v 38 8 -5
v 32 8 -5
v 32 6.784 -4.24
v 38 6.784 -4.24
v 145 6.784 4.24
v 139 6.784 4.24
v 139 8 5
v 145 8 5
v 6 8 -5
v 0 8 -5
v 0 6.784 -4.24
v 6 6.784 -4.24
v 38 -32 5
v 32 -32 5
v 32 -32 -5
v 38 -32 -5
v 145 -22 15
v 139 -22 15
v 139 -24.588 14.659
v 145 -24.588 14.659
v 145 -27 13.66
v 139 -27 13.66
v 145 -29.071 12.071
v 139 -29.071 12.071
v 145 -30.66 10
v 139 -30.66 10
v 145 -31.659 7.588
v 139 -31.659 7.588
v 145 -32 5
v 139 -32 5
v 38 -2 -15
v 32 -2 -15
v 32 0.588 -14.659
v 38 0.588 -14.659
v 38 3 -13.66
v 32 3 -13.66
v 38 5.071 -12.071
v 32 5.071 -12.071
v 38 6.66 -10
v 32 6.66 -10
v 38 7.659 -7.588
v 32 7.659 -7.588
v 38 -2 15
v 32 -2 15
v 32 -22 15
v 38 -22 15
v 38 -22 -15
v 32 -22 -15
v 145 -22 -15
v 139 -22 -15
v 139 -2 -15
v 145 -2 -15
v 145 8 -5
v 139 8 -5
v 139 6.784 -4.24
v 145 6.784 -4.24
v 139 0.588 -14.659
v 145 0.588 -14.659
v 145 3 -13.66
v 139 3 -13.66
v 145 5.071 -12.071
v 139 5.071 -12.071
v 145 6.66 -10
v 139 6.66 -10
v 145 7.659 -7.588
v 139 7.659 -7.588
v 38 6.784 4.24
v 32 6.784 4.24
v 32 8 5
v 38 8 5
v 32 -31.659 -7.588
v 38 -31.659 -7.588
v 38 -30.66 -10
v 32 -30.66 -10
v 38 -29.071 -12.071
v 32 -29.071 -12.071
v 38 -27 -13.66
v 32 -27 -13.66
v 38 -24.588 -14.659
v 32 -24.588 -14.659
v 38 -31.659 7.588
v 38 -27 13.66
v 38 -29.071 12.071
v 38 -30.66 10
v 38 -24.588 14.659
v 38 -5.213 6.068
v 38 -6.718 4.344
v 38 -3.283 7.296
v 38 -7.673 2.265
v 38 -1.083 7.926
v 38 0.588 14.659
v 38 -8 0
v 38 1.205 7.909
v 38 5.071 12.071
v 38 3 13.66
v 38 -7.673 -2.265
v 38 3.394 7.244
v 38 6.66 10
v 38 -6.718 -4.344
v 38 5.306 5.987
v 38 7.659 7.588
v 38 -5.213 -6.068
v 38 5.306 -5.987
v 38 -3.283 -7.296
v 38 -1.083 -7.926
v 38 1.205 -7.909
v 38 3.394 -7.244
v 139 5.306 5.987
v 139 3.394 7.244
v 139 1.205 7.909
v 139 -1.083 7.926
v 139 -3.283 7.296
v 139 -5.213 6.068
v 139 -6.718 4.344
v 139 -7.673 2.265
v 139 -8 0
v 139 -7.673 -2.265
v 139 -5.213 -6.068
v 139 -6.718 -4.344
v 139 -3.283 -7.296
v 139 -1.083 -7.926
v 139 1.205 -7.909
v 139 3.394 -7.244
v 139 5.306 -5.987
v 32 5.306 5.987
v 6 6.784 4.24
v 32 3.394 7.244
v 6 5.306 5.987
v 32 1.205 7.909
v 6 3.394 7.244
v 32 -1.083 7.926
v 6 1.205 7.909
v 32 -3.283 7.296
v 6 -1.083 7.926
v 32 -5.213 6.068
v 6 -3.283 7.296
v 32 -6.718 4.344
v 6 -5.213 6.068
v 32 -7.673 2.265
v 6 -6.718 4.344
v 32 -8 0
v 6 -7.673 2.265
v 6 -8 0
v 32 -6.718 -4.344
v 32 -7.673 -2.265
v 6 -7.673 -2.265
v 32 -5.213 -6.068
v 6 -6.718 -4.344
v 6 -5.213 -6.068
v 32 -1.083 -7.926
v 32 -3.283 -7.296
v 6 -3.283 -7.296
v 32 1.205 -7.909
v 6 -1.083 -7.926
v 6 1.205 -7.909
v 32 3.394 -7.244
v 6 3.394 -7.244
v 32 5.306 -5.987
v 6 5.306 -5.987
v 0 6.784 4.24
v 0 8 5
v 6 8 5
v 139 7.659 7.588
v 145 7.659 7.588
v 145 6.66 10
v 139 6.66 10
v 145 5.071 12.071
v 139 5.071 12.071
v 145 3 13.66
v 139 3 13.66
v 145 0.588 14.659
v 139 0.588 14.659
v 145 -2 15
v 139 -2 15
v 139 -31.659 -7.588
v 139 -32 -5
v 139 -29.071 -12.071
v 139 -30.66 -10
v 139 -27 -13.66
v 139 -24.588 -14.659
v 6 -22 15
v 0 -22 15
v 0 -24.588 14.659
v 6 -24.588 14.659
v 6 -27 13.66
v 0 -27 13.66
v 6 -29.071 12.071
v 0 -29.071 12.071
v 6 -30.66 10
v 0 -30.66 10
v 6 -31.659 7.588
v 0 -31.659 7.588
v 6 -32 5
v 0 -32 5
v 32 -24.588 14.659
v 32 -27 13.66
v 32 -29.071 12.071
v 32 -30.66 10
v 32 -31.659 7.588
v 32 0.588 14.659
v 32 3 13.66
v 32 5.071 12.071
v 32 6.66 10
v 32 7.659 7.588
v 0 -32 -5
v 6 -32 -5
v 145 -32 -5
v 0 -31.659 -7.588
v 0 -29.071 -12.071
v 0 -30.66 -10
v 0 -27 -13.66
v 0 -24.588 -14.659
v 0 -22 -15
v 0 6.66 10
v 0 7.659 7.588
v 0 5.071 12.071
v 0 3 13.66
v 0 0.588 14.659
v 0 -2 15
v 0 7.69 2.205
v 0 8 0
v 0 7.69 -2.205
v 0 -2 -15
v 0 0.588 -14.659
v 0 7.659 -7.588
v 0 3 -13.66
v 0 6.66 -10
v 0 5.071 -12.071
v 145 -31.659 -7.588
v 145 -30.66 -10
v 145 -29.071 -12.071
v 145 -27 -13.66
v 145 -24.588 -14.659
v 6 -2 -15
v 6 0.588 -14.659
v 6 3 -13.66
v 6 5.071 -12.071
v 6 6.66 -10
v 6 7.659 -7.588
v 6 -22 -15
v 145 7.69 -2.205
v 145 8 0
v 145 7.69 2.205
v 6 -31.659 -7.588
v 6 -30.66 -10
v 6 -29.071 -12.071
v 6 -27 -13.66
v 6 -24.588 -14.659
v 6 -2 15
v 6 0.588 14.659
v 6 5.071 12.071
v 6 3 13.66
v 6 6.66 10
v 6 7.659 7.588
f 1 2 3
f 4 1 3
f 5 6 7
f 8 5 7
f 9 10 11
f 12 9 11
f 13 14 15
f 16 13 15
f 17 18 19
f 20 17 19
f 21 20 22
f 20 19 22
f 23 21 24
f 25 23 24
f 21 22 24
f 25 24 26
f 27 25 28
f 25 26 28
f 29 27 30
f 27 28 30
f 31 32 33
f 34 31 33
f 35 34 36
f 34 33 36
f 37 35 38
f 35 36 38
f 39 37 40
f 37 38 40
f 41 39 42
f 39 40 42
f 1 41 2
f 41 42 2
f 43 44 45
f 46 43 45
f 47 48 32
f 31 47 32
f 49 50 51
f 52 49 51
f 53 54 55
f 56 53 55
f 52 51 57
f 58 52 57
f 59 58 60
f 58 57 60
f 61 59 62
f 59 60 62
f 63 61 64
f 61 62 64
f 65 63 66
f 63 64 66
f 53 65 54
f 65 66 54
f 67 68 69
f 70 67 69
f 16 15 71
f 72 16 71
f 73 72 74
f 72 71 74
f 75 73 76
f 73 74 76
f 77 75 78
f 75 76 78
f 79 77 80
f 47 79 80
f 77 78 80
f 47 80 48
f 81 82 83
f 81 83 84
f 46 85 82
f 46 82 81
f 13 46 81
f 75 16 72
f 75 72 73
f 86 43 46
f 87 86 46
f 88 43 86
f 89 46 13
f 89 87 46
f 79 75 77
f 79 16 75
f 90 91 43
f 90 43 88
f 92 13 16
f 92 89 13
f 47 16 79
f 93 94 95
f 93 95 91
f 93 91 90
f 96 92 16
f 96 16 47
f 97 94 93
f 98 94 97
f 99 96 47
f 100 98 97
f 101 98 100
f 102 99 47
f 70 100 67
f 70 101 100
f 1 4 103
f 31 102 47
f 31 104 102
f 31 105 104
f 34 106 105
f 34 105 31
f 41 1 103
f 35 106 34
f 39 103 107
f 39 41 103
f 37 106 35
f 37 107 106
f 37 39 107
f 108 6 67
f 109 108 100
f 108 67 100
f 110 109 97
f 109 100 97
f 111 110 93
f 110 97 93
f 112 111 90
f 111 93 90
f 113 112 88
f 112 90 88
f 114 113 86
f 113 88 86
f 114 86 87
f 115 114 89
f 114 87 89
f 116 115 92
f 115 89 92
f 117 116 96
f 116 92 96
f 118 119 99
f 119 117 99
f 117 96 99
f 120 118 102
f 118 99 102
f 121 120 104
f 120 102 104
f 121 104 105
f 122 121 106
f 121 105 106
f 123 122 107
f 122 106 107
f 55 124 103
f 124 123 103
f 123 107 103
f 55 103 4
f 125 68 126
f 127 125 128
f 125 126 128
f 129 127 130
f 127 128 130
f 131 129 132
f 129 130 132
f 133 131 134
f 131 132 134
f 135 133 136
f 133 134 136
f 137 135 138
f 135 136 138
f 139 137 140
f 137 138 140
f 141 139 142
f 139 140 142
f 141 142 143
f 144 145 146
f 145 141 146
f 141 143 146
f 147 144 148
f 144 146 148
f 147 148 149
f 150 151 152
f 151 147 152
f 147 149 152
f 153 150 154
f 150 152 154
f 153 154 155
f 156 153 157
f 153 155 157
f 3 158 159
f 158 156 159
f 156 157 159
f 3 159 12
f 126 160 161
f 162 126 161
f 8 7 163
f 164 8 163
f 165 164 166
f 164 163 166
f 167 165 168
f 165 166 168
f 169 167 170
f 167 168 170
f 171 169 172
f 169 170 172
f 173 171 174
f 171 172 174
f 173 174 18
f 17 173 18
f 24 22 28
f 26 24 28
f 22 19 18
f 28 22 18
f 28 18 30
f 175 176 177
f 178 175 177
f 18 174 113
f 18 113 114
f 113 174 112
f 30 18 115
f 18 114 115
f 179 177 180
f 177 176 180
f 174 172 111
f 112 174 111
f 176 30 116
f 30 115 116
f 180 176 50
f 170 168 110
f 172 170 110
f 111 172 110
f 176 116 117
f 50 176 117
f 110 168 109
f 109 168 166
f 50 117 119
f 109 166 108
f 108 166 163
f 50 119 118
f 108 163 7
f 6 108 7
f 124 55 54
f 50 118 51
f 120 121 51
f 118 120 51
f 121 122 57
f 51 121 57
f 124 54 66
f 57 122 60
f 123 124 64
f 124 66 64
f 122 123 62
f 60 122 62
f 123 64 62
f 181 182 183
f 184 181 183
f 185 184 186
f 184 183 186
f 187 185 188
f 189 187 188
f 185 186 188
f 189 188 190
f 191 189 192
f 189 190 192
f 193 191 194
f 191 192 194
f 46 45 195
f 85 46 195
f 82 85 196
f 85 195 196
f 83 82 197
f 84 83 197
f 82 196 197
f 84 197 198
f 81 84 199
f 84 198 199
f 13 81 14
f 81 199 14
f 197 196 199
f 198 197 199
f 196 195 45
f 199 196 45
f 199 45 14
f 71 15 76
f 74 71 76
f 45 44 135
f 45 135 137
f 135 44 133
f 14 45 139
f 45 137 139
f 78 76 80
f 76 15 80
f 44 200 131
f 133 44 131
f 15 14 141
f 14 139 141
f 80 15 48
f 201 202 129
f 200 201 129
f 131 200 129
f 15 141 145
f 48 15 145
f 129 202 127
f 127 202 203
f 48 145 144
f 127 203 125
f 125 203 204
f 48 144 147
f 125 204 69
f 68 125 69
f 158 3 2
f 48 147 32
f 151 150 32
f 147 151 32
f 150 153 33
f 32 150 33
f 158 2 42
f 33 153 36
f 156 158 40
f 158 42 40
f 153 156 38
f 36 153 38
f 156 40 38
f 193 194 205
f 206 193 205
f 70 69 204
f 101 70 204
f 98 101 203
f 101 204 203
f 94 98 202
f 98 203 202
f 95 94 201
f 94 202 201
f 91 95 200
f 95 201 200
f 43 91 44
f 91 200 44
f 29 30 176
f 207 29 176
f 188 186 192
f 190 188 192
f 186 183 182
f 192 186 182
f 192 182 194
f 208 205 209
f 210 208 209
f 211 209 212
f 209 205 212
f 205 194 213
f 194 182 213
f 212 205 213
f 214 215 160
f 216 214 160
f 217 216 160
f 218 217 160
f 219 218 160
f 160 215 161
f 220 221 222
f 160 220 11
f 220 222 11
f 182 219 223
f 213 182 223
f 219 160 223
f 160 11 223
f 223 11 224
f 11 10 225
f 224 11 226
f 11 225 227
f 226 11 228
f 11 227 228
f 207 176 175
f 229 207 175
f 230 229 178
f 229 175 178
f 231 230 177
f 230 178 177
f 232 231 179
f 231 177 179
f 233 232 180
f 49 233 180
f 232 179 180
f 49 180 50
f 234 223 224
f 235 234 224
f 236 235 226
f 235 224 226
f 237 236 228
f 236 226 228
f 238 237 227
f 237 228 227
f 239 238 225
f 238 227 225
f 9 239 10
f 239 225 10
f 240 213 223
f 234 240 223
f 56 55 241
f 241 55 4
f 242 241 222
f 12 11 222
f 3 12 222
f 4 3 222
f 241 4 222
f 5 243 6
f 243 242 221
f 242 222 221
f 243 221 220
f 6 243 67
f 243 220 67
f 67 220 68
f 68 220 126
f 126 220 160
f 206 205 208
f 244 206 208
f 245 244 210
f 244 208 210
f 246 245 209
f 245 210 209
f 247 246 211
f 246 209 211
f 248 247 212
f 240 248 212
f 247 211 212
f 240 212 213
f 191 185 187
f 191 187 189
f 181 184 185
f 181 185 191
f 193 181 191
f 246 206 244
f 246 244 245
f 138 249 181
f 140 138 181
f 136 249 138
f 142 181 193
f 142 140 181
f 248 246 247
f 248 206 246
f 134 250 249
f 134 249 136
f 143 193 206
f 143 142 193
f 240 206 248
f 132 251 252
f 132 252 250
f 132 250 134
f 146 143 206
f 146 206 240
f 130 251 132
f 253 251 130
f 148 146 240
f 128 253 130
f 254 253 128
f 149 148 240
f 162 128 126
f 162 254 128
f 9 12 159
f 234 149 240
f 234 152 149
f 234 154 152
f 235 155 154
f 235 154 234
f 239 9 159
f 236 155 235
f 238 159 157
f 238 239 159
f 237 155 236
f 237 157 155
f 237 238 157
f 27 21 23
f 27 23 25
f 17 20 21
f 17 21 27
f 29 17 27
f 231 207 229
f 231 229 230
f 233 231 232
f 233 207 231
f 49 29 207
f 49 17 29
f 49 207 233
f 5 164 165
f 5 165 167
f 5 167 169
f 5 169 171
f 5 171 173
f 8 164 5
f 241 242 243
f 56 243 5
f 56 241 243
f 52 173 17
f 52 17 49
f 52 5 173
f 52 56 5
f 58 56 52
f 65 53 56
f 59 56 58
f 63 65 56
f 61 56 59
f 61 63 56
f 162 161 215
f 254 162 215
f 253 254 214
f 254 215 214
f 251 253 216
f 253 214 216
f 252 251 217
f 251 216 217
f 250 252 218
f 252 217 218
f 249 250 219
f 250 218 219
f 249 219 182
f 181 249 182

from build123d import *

# Parameters (mm, degrees)
SCHIZZO1_R                   = 8
ESTRUSIONE_ESTRUSIONE1_DEPTH = 145
ESTRUSIONE_ESTRUSIONE2_DEPTH = 6
RIPETIZIONE_A_L1_COUNT       = 2
RIPETIZIONE_A_L1_PITCH       = 32
RIPETIZIONE_A_L2_COUNT       = 2
RIPETIZIONE_A_L2_PITCH       = 139
EXTRUDE2_DEPTH               = 150.244765402


with BuildPart() as part:
    # Schizzo1 → Estrusione-Estrusione1 (new body)
    with BuildSketch(Plane(origin=(0, 0, 0), x_dir=(0, 0, -1), z_dir=(1, 0, 0))):
        Circle(SCHIZZO1_R)
    extrude(amount=ESTRUSIONE_ESTRUSIONE1_DEPTH)

    # Schizzo2 → Estrusione-Estrusione2 (add)
    with BuildSketch(Plane.ZY):
        with BuildLine():
            Line((-5, 8), (5, 8))
            ThreePointArc((5, 8), (12.071067812, 5.071067812), (15, -2))
            Line((15, -2), (15, -22))
            ThreePointArc((15, -22), (12.071067812, -29.071067812), (5, -32))
            Line((5, -32), (-5, -32))
            ThreePointArc((-5, -32), (-12.071067812, -29.071067812), (-15, -22))
            Line((-15, -22), (-15, -2))
            ThreePointArc((-15, -2), (-12.071067812, 5.071067812), (-5, 8))
        make_face()
    estrusione_estrusione2 = extrude(amount=-ESTRUSIONE_ESTRUSIONE2_DEPTH)

    # Ripetizione a L1: Estrusione-Estrusione2 ×2
    with Locations(*[(i * RIPETIZIONE_A_L1_PITCH, 0, 0) for i in range(1, RIPETIZIONE_A_L1_COUNT)]):
        add(estrusione_estrusione2)

    # Ripetizione a L2: Estrusione-Estrusione2 ×2
    with Locations(*[(i * RIPETIZIONE_A_L2_PITCH, 0, 0) for i in range(1, RIPETIZIONE_A_L2_COUNT)]):
        add(estrusione_estrusione2)

    # Sketch1 → Extrude2 (cut, through all)
    with BuildSketch(Plane.ZY):
        with BuildLine():
            Line((-5, 8), (-4.23999152, 6.783986432))
            ThreePointArc((-4.23999152, 6.783986432), (0, 8), (4.23999152, 6.783986432))
            Line((4.23999152, 6.783986432), (5, 8))
            Line((5, 8), (5, 8.502646834))
            Line((5, 8.502646834), (-5, 8.502646834))
            Line((-5, 8.502646834), (-5, 8))
        make_face()
    extrude(amount=-EXTRUDE2_DEPTH, mode=Mode.SUBTRACT)


solid = part.part
